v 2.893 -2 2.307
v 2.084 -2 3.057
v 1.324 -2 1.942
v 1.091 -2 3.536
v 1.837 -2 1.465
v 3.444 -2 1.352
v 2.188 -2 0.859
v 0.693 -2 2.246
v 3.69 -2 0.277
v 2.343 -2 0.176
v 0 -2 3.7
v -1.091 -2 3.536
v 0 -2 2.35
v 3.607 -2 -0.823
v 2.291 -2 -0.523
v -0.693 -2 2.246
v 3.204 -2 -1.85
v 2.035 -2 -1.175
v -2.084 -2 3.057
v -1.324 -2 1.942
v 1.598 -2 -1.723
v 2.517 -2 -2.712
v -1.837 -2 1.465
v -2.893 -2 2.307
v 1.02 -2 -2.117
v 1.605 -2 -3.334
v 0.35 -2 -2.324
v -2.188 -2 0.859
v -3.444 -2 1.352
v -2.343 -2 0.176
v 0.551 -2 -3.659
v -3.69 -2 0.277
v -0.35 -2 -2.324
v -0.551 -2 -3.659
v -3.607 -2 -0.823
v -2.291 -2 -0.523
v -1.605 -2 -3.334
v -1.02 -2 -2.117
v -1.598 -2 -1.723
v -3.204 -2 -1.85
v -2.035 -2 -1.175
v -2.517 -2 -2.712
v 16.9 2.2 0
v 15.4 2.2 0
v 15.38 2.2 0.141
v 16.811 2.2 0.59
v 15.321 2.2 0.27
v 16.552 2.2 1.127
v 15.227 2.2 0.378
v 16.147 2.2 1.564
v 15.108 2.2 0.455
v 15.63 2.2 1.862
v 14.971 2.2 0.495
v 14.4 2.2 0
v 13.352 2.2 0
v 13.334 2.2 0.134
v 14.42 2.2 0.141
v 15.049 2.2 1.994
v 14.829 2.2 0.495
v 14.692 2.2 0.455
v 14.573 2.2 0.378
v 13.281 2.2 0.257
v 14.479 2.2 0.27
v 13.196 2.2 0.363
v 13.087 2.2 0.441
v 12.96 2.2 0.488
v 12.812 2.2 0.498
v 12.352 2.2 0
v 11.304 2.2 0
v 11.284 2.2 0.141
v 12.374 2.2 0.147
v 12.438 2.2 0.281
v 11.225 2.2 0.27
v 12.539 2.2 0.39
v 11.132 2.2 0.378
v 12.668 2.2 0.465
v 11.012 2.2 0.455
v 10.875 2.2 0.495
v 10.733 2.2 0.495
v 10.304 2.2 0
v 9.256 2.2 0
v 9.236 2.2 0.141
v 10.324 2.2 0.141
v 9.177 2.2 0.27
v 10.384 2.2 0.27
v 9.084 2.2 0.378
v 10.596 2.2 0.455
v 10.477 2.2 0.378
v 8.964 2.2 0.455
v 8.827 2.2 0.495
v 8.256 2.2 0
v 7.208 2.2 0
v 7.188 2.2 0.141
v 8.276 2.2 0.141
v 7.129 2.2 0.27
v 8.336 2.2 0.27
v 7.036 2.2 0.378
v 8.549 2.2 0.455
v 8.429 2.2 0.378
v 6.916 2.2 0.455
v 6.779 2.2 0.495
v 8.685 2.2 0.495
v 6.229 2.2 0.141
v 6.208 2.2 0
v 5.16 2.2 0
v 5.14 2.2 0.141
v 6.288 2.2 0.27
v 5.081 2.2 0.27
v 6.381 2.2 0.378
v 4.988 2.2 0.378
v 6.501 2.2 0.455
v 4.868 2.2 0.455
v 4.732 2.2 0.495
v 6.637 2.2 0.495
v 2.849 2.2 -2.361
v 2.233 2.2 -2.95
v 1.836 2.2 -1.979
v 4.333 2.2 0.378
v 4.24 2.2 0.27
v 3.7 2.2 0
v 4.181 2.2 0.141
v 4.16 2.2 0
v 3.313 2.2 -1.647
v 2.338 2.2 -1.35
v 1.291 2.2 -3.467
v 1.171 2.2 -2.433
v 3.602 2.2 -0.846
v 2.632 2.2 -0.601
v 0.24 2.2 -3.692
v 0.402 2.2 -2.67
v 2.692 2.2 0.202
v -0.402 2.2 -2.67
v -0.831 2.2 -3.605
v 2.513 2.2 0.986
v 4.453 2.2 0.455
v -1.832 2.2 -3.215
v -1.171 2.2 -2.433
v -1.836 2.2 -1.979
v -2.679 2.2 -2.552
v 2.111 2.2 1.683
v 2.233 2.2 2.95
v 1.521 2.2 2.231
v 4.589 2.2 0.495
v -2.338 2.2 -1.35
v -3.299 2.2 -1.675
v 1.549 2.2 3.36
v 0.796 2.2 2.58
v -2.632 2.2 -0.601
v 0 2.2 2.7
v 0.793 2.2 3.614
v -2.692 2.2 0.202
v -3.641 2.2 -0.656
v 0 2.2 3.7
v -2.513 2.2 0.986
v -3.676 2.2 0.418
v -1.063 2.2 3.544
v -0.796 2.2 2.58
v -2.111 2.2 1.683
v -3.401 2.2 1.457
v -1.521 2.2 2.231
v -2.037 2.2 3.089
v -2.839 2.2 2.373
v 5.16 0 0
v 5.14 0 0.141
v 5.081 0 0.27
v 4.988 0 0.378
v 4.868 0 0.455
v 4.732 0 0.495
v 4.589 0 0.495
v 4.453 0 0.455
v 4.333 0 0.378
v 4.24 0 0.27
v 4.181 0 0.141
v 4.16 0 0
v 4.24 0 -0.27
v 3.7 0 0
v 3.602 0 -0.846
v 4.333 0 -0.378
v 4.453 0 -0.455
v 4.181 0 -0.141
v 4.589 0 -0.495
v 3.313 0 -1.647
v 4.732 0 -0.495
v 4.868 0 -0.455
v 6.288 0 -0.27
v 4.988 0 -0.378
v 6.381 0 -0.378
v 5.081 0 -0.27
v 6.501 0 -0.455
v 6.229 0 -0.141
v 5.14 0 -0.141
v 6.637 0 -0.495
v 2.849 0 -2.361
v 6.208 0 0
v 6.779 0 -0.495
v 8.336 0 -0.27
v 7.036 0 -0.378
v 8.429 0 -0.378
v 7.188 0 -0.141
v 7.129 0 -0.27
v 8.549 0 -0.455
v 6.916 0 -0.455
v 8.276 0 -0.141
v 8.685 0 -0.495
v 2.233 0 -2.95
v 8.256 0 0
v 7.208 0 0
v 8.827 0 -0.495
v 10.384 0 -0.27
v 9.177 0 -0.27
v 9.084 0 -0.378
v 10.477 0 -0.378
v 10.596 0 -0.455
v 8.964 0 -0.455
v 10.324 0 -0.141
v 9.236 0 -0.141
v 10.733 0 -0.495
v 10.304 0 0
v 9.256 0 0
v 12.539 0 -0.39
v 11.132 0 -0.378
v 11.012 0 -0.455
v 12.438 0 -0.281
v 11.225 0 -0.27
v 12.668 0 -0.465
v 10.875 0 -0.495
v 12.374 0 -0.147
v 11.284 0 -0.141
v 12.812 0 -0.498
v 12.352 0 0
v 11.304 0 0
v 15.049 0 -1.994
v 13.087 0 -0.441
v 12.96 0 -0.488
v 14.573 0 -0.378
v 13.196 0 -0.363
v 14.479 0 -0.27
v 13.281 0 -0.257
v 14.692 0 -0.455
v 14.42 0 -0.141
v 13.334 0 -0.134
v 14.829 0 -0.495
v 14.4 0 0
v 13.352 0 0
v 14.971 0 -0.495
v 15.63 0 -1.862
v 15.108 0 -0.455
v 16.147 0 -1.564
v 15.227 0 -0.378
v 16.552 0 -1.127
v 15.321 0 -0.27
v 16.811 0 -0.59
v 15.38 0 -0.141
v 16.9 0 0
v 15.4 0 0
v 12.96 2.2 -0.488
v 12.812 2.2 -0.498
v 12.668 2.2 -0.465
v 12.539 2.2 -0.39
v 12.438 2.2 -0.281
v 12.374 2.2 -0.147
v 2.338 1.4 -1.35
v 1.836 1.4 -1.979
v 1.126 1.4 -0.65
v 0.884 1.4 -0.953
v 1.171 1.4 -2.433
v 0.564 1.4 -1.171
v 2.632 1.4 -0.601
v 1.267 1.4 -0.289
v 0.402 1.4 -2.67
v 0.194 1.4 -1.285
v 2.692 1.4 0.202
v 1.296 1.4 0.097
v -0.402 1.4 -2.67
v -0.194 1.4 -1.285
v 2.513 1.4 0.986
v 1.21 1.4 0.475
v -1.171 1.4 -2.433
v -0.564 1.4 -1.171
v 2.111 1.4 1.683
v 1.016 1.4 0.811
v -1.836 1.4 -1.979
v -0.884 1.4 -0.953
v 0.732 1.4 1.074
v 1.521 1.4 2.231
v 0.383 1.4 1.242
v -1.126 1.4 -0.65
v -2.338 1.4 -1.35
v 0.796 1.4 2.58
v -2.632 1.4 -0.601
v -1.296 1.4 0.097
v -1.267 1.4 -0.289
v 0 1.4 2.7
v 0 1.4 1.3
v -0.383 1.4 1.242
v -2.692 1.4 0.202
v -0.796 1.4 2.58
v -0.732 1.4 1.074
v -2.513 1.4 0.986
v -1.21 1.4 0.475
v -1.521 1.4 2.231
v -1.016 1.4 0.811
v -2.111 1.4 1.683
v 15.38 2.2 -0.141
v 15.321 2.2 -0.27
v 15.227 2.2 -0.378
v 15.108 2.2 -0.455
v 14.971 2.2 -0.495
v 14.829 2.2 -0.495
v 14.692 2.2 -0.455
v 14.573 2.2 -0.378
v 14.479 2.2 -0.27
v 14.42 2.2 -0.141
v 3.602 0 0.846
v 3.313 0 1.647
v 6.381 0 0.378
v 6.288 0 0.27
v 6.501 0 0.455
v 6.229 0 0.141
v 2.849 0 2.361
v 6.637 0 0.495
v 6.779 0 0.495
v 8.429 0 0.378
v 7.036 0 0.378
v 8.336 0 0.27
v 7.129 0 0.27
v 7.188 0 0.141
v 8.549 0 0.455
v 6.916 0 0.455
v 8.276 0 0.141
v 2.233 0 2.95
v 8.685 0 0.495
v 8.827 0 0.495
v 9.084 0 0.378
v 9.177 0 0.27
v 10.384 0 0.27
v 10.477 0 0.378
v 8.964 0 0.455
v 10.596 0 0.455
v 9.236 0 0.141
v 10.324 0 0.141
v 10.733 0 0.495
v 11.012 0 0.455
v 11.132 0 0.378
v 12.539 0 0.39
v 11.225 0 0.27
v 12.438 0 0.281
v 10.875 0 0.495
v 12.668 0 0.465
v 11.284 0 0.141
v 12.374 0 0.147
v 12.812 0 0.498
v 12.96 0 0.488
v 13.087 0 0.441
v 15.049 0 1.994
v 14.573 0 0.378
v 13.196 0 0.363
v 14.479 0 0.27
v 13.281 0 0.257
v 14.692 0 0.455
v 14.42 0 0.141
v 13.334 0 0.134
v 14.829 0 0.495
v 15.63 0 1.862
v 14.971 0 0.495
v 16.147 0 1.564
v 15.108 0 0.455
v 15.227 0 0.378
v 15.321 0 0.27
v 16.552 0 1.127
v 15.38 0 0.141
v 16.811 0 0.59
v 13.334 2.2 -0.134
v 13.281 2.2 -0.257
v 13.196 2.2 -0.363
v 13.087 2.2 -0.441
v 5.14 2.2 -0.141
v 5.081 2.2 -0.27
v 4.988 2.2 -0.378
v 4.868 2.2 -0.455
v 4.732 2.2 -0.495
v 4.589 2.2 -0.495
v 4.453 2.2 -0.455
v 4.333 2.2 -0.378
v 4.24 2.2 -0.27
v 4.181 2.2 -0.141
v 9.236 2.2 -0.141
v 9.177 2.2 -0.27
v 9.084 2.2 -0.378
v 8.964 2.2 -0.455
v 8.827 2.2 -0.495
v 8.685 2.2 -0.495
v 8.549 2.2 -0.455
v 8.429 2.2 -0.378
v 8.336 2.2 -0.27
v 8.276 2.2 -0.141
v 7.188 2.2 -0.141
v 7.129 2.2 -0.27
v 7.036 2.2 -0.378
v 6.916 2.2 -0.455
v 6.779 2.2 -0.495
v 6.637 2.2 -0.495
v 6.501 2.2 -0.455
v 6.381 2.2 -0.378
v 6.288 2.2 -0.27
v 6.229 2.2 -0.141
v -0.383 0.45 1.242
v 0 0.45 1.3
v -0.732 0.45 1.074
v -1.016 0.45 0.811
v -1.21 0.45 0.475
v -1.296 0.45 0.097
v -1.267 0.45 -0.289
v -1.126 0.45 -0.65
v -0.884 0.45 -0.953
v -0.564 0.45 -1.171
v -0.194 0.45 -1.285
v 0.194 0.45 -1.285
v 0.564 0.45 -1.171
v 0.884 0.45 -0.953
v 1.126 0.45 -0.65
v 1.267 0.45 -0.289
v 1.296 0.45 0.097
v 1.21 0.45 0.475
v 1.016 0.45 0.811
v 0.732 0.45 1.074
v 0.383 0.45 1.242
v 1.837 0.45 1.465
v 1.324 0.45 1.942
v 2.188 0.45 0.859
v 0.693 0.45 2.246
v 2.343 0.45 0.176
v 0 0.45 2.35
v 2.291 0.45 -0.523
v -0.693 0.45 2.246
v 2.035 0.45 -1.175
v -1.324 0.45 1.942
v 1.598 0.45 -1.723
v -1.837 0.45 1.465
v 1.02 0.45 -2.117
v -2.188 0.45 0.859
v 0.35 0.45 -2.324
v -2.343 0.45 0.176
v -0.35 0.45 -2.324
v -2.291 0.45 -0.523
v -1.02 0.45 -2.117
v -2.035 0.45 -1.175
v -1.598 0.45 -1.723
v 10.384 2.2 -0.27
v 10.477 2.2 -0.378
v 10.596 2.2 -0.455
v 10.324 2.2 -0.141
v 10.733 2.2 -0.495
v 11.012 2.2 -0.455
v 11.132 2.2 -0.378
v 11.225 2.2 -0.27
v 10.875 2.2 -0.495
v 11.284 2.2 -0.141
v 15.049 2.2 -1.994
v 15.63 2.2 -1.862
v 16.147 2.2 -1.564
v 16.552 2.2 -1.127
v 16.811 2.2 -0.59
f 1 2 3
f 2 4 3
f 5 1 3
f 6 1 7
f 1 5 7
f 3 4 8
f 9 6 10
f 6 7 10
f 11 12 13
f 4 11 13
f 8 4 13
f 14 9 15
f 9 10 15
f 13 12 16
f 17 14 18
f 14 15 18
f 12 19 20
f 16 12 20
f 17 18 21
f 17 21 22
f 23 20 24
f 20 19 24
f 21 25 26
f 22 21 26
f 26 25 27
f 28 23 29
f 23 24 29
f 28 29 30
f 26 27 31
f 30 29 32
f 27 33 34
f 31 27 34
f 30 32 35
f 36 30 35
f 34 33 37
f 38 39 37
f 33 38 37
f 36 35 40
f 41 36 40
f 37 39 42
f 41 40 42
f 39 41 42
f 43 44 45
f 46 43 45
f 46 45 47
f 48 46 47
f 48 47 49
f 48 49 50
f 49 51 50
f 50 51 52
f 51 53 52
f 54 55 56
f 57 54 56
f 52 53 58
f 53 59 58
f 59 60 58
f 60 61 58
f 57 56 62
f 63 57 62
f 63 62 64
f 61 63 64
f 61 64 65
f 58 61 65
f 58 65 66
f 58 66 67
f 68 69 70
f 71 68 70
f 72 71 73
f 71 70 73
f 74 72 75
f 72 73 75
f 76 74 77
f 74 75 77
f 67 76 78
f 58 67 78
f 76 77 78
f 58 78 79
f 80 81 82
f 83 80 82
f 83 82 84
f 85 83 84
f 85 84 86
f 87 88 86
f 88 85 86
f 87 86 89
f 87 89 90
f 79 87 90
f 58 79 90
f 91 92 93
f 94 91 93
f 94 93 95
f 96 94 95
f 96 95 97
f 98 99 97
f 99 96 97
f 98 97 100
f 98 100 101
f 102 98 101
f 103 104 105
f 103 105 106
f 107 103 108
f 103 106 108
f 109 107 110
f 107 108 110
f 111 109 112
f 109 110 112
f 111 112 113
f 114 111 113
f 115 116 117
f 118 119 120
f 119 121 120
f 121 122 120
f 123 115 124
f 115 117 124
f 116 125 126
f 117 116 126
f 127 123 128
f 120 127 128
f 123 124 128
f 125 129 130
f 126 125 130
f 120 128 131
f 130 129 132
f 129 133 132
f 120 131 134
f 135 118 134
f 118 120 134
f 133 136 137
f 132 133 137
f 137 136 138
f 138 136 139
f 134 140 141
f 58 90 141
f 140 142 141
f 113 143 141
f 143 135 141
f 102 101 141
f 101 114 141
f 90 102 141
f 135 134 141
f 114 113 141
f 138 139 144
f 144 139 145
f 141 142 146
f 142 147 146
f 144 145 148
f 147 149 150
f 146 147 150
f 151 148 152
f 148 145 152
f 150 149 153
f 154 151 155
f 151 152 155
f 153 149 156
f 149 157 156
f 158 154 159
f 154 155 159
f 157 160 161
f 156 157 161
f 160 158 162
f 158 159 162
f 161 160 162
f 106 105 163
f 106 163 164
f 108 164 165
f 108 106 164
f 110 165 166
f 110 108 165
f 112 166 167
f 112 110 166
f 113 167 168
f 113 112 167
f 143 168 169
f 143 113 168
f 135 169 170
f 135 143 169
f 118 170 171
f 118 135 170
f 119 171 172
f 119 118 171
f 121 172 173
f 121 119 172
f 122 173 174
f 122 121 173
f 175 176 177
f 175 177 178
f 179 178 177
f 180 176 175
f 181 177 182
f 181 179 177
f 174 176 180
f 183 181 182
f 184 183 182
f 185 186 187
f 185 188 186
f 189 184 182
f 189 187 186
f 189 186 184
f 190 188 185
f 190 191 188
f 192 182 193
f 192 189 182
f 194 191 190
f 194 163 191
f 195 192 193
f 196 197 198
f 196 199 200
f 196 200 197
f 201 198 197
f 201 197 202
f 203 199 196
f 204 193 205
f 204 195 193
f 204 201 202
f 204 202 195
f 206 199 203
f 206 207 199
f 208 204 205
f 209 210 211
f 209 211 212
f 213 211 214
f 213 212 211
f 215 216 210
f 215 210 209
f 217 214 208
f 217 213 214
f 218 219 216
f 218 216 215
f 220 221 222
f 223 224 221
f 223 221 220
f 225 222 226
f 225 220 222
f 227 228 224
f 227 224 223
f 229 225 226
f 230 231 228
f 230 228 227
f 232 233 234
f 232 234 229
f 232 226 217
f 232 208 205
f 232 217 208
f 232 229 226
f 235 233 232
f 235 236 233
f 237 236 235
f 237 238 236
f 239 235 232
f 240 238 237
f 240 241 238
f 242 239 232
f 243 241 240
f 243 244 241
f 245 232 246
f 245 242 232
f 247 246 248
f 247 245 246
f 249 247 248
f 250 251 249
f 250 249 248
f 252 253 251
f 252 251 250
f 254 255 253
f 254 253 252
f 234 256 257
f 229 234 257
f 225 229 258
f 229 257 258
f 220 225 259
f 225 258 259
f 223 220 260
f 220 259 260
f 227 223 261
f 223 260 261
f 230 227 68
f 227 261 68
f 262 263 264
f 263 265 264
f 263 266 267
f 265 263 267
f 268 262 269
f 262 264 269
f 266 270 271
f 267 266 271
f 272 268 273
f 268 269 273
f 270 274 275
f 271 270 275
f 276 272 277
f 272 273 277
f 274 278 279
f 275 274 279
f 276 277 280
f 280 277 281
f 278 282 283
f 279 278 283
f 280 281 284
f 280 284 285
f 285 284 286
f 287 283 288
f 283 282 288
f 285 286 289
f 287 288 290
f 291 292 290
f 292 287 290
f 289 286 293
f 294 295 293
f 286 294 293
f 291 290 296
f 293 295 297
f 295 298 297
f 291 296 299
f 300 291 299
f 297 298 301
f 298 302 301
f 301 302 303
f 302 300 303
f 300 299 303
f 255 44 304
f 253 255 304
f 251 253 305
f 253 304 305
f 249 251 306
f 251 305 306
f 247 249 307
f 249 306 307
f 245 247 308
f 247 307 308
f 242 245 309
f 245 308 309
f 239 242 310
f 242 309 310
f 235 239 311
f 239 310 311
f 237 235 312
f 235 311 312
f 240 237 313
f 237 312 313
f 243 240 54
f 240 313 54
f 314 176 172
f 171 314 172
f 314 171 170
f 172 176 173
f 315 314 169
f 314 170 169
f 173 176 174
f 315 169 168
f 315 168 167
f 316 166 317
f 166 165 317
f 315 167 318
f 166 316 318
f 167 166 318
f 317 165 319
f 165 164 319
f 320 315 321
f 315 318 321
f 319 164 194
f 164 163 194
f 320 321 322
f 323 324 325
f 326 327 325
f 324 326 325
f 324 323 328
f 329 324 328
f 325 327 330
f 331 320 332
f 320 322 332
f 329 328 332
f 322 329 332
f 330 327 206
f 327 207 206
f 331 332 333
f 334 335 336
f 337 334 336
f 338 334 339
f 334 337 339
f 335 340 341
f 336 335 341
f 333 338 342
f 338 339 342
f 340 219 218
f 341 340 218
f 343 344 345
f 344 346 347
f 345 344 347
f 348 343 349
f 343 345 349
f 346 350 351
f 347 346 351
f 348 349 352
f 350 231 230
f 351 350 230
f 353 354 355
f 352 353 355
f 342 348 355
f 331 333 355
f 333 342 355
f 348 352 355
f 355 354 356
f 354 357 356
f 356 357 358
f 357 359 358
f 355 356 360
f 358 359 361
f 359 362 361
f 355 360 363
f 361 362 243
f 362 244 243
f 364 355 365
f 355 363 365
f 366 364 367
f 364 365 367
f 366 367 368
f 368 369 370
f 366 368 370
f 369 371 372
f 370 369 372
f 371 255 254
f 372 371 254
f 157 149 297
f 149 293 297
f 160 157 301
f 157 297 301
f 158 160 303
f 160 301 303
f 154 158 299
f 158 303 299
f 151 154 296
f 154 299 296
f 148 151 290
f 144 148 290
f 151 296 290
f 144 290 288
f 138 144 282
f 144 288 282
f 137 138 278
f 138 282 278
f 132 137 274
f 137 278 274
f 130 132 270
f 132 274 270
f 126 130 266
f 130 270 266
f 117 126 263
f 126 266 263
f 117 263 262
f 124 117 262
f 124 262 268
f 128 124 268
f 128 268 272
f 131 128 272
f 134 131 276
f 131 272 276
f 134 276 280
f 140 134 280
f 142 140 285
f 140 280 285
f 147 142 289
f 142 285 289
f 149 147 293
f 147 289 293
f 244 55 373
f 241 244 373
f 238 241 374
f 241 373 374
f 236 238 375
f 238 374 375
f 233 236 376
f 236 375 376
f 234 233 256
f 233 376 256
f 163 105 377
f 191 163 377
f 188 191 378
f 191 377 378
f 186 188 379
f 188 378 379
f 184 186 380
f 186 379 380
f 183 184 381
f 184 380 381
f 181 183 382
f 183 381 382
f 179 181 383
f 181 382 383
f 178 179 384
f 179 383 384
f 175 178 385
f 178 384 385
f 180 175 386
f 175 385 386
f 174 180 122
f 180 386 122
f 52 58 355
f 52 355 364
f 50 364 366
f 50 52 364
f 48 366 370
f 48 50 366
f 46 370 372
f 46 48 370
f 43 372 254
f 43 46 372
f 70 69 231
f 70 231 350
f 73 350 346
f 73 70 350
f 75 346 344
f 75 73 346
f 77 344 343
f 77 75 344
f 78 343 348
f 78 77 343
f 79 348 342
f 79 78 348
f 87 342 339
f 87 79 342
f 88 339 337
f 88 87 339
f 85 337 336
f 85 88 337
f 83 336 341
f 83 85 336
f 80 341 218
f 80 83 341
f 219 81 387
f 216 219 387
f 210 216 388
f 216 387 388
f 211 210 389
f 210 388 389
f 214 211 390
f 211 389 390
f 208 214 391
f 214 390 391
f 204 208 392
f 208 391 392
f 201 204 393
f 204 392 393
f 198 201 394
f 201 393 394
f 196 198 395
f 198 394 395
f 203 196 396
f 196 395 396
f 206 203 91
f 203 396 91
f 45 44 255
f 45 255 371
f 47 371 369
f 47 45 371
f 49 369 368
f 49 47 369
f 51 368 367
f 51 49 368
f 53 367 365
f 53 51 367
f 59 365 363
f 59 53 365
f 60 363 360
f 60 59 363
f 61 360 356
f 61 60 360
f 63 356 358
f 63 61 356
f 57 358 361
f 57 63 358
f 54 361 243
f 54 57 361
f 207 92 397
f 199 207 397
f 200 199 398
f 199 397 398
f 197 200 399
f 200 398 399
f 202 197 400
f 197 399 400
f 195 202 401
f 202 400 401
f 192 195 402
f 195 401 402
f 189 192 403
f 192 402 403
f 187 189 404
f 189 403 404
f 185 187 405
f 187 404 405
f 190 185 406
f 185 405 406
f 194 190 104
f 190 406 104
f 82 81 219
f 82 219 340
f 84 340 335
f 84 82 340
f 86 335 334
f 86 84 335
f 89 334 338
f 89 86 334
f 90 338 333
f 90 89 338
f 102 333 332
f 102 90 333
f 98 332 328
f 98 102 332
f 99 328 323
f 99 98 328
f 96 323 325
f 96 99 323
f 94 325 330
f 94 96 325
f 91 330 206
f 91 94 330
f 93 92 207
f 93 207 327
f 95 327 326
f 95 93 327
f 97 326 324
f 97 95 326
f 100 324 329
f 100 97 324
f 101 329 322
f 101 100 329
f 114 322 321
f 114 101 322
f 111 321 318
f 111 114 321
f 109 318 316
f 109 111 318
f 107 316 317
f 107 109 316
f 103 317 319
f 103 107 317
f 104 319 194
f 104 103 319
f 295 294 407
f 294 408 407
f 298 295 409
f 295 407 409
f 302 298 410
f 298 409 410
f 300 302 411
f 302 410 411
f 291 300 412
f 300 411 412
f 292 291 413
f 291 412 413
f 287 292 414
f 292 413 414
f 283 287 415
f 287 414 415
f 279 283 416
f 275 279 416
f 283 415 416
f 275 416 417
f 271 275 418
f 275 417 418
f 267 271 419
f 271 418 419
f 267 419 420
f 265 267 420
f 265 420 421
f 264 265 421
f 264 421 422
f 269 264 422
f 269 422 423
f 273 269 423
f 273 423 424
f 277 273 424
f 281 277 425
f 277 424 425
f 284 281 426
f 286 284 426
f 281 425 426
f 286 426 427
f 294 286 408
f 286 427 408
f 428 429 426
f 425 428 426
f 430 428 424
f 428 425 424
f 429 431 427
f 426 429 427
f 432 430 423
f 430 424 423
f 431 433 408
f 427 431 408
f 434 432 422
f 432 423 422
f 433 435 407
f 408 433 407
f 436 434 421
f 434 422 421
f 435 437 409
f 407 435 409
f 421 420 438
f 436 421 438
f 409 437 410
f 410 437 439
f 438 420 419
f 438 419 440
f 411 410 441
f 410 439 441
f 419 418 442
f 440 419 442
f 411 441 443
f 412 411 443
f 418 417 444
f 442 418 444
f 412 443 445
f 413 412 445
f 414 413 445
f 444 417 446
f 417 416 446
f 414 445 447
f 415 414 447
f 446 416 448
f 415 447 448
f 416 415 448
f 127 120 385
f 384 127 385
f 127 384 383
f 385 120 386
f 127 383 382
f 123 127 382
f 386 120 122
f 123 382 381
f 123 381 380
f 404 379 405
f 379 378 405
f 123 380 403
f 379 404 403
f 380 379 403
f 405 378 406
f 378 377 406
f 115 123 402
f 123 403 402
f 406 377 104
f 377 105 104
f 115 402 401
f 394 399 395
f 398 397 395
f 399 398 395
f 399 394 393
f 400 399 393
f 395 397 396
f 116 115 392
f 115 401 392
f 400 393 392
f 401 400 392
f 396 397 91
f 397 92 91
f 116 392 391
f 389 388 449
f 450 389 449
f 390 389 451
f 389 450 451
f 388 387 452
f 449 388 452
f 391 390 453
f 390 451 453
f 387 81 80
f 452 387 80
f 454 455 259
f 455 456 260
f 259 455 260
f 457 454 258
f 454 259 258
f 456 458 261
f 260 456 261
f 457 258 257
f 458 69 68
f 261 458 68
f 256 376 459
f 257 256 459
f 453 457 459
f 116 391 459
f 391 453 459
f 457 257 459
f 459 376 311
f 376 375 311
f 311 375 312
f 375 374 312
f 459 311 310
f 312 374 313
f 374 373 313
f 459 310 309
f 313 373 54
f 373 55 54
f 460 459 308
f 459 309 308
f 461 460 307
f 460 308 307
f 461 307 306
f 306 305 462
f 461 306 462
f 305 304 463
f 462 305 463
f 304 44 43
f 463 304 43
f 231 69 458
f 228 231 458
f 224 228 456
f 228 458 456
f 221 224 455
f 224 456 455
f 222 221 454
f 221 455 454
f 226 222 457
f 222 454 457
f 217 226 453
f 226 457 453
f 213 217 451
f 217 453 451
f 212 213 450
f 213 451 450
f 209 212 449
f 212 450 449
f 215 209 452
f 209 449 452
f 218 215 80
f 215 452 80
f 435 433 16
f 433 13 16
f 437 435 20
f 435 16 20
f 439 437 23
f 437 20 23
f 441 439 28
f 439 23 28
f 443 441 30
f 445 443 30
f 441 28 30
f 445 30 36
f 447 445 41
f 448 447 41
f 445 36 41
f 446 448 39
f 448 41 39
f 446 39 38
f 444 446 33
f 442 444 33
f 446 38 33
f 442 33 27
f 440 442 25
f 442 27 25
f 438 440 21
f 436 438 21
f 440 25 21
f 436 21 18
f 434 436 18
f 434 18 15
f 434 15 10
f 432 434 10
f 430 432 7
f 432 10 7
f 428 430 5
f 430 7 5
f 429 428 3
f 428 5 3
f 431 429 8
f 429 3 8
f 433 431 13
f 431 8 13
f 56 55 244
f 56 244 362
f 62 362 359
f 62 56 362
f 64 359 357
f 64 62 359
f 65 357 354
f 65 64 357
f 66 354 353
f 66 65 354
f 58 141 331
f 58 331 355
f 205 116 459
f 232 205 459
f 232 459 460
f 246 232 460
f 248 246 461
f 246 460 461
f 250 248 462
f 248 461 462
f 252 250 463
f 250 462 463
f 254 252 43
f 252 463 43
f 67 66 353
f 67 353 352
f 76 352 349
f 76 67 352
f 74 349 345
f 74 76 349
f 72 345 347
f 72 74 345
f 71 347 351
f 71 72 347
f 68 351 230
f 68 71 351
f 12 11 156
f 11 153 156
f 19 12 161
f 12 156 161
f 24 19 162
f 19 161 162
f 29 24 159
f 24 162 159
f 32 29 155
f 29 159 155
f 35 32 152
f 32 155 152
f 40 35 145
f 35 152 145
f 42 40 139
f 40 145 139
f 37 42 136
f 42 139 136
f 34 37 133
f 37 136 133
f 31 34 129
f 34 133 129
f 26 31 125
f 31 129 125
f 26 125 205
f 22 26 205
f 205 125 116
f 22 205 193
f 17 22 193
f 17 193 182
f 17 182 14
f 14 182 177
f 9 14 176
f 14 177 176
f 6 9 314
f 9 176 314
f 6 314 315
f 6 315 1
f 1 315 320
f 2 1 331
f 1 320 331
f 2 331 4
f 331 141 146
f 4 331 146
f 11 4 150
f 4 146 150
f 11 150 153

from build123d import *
from build123d.topology import SkipClean

# Parameters (mm, degrees)
BOSS_EXTRUDE1_START = 2.2
BOSS_EXTRUDE1_DEPTH = 2.2


with BuildPart() as part:
    # Sketch2 → Revolve1 (revolve)
    with BuildSketch(Plane.XY, mode=Mode.PRIVATE) as revolve1_sk:
        Polygon((2.7, 2.2), (2.7, 1.4), (1.3, 1.4), (1.3, 0.45), (2.35, 0.45), (2.35, -2), (3.7, -2), (3.7, 2.2), align=None)
    revolve(revolve1_sk.sketch.rotate(Axis((0, 55, 0), (0, -1, 0)), 90), axis=Axis((0, 55, 0), (0, -1, 0)))

    # Sketch3 → Boss-Extrude1 (add)
    with BuildSketch(Plane(origin=(0, 0, 0), x_dir=(1, 0, 0), z_dir=(0, 1, 0)).offset(BOSS_EXTRUDE1_START)):
        with BuildLine():
            ThreePointArc((3.7, 0), (3.313087927, -1.647254803), (2.233271143, -2.95))
            Line((2.233271143, -2.95), (15.04870989, -1.994463679))
            ThreePointArc((15.04870989, -1.994463679), (13.729944749, -1.622026729), (12.960476899, -0.488108738))
            ThreePointArc((12.960476899, -0.488108738), (12.539189082, -0.389998964), (12.35208013, 0))
            Line((12.35208013, 0), (11.304160261, 0))
            ThreePointArc((11.304160261, 0), (10.804160261, -0.5), (10.304160261, 0))
            Line((10.304160261, 0), (9.256240391, 0))
            ThreePointArc((9.256240391, 0), (8.756240391, -0.5), (8.256240391, 0))
            Line((8.256240391, 0), (7.208320521, 0))
            ThreePointArc((7.208320521, 0), (6.708320521, -0.5), (6.208320521, 0))
            Line((6.208320521, 0), (5.160400652, 0))
            ThreePointArc((5.160400652, 0), (4.660400652, -0.5), (4.160400652, 0))
            Line((4.160400652, 0), (3.7, 0))
        make_face()
        with BuildLine():
            ThreePointArc((12.960476899, -0.488108738), (13.729944749, -1.622026729), (15.04870989, -1.994463679))
            ThreePointArc((15.04870989, -1.994463679), (16.36584784, -1.360621222), (16.9, 0))
            Line((16.9, 0), (15.4, 0))
            ThreePointArc((15.4, 0), (14.9, -0.5), (14.4, 0))
            Line((14.4, 0), (13.35208013, 0))
            ThreePointArc((13.35208013, 0), (13.242079095, -0.312891048), (12.960476899, -0.488108738))
        make_face()
    boss_extrude1 = extrude(amount=-BOSS_EXTRUDE1_DEPTH)

    # Mirror1: Boss-Extrude1 across plane
    with SkipClean():  # the faces are left unmerged after this step: merging them gives an invalid solid
        add(boss_extrude1.mirror(Plane(origin=(0, 17.160462404, 0), x_dir=(1, 0, 0), z_dir=(0, 0, -1))))


solid = part.part
